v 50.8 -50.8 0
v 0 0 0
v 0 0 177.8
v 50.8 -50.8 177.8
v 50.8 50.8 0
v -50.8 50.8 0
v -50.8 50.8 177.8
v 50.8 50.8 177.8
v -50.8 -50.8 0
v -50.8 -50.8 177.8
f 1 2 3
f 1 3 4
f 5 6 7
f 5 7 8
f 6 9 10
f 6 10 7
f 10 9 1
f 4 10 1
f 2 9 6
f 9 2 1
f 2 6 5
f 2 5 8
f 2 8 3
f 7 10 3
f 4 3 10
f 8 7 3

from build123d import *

# Parameters (mm, degrees)
F0_W     = 101.6
F0_H     = 101.6
F1_DEPTH = 177.8
F3_DEPTH = 177.8


with BuildPart() as f1:
    # F0 (on Top) → F1 (new body)
    with BuildSketch(Plane.XY):
        Rectangle(F0_W, F0_H)
    extrude(amount=F1_DEPTH)

    # F2 (on face) → F3 (cut, through all)
    with BuildSketch(Plane.XY.offset(177.8)):
        Polygon((50.8, 50.8), (0, 0), (50.8, -50.8), align=None)
    extrude(amount=-F3_DEPTH, mode=Mode.SUBTRACT)


solid = f1.part
